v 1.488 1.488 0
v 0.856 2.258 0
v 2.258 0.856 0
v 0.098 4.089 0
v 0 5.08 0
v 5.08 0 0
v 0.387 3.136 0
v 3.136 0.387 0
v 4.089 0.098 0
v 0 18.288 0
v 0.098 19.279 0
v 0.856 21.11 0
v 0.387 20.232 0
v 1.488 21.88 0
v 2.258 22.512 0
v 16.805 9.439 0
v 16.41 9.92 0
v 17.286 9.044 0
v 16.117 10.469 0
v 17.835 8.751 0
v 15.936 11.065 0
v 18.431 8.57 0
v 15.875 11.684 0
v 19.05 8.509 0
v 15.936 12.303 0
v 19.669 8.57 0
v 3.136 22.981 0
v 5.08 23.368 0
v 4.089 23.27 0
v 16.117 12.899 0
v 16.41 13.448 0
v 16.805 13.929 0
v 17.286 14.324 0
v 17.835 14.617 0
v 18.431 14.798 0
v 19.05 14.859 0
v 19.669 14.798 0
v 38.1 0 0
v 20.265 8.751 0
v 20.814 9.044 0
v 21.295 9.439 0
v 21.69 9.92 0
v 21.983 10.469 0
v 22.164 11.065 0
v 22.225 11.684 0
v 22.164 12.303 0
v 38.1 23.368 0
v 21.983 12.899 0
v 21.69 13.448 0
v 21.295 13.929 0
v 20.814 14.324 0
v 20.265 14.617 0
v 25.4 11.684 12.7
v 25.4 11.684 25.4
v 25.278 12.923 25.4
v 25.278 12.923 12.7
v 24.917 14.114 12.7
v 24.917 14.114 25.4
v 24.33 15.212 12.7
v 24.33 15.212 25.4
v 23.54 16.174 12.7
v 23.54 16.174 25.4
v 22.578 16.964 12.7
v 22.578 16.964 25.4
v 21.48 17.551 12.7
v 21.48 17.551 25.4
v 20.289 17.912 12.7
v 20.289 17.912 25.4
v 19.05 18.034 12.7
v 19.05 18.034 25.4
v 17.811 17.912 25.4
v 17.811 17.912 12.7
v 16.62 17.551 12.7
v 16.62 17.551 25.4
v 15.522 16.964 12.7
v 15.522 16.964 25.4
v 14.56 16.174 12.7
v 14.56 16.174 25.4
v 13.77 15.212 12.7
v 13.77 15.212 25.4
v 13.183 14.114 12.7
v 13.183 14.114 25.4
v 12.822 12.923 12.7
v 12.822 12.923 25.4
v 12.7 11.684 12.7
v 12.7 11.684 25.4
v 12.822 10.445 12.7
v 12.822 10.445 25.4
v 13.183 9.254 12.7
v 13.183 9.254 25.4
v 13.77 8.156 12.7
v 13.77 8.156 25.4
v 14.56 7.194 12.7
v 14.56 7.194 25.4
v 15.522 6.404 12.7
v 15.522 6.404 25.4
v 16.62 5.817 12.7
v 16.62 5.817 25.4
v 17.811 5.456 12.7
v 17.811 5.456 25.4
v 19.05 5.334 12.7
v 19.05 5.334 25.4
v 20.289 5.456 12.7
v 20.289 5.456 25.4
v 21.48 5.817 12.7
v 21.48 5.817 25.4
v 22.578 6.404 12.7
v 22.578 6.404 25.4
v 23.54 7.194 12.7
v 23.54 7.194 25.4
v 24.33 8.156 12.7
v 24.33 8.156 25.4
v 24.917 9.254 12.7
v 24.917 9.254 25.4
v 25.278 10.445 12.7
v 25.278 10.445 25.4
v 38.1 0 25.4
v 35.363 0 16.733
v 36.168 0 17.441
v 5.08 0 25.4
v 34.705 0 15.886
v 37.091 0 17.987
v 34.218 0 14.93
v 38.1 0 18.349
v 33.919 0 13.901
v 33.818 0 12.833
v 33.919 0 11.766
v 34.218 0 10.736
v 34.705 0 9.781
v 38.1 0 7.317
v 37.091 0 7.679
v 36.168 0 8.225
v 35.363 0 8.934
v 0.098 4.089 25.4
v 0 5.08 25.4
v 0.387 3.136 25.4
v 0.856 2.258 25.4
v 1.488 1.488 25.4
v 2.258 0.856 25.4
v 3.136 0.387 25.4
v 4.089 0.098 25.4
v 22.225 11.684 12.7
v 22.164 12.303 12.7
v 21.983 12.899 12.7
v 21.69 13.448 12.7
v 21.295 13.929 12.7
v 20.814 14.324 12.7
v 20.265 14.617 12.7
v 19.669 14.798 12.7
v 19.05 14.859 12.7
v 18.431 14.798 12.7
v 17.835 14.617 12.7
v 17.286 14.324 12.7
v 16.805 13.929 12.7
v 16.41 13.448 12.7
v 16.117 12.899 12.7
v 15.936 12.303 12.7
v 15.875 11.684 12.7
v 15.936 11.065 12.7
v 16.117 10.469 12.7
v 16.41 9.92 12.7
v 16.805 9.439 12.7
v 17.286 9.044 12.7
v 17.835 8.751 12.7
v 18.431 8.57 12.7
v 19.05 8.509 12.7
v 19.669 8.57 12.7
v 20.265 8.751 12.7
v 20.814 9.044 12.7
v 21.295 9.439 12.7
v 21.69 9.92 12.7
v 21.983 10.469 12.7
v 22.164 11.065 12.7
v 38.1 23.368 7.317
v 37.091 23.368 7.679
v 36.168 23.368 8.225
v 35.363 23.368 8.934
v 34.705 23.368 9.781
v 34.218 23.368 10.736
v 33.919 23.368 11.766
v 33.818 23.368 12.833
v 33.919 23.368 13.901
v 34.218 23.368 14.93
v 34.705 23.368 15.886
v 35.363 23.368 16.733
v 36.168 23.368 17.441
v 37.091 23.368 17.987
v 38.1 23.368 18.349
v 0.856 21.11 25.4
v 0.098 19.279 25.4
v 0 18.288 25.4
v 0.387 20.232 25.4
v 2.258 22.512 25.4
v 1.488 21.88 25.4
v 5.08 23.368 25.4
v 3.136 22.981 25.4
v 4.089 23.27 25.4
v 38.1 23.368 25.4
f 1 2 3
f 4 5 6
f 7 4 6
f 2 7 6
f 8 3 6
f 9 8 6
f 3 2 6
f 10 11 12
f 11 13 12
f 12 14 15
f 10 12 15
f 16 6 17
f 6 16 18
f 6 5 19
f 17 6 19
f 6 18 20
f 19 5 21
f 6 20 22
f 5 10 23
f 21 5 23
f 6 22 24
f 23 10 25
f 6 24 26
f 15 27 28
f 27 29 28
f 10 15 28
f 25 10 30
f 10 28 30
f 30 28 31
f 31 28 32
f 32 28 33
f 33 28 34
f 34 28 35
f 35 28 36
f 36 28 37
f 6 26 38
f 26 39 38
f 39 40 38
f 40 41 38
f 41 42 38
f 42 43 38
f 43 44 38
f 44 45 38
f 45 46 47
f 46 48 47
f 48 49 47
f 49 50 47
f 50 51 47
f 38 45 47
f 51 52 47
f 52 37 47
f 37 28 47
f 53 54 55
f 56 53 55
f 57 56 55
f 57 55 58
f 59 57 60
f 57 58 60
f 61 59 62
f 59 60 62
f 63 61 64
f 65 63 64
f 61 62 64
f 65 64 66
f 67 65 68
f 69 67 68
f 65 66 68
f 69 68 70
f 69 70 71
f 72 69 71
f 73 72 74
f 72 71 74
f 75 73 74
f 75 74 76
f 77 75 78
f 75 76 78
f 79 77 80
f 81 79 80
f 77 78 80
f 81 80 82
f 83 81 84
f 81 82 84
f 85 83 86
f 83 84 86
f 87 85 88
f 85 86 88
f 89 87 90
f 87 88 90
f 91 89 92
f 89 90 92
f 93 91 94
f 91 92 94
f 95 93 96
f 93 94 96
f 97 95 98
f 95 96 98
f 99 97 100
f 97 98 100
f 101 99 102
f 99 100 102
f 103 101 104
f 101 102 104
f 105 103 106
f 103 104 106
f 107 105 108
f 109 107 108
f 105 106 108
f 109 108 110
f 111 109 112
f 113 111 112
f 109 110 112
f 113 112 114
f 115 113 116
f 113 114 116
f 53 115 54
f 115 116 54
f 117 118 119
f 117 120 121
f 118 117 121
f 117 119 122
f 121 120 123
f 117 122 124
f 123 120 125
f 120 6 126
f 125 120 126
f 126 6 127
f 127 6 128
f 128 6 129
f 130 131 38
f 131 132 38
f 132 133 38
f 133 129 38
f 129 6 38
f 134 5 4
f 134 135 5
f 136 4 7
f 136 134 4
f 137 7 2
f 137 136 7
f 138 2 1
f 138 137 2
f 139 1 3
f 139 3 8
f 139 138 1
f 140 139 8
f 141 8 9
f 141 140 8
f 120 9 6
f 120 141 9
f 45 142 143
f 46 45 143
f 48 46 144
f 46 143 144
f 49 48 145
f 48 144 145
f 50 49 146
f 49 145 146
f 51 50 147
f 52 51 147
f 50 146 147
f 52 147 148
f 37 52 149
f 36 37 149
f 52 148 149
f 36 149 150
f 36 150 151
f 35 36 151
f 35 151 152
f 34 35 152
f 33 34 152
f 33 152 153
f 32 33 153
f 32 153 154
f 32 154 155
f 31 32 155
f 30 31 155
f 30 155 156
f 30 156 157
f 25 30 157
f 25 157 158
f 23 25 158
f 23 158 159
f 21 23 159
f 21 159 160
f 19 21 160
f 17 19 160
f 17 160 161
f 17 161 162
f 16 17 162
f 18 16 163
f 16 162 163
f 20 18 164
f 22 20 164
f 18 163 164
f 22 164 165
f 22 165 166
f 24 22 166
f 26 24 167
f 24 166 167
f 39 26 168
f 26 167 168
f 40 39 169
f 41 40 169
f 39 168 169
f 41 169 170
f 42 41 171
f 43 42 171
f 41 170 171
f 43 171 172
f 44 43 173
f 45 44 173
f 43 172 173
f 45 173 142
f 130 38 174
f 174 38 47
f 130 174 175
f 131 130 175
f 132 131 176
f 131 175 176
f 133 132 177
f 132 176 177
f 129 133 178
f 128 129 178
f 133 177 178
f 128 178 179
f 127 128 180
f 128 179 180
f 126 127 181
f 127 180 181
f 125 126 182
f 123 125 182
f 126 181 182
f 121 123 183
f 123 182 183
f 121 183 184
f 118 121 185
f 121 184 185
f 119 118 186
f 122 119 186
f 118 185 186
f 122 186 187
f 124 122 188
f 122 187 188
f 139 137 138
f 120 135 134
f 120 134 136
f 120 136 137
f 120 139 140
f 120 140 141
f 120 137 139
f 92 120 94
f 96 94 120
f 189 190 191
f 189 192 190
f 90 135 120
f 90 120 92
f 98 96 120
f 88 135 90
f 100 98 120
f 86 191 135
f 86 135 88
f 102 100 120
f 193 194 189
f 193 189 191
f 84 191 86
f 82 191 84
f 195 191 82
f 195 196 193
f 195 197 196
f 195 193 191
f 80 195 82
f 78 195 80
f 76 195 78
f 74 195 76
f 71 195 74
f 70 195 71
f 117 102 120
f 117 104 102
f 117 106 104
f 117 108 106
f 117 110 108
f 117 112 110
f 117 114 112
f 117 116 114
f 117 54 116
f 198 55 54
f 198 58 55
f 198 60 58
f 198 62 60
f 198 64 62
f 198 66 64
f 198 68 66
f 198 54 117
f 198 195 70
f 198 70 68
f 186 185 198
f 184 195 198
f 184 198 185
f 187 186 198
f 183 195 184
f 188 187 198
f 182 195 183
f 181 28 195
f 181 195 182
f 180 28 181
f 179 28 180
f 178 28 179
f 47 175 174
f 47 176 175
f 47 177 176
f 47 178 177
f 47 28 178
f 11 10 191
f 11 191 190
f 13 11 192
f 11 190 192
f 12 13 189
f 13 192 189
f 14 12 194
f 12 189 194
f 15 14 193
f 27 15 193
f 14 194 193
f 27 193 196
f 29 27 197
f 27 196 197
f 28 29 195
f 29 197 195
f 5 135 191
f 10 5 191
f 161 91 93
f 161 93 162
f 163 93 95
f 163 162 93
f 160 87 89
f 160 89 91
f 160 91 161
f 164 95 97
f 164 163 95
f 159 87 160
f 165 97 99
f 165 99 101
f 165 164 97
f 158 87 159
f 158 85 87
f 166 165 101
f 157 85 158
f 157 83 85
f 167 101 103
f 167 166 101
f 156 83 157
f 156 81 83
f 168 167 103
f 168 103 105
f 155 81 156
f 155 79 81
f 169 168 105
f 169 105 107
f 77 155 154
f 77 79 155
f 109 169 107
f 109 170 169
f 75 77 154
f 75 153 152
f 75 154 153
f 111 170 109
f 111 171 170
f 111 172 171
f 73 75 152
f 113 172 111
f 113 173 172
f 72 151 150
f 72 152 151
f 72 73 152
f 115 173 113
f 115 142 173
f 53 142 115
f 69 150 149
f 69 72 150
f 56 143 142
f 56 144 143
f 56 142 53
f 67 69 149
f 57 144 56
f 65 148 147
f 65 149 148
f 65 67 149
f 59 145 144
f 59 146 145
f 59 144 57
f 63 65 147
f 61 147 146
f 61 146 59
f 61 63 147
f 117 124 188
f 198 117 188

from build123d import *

# Parameters (mm, degrees)
F0_W     = 38.1
F0_H     = 23.368
F1_DEPTH = 25.4
F2_R     = 6.35
F3_DEPTH = 12.7
F4_R     = 3.175
F5_DEPTH = 25.4
F6_R     = 5.08
F8_DEPTH = 25.4


with BuildPart() as f1:
    # F0 (on Top) → F1 (new body)
    with BuildSketch(Plane.XY):
        with Locations((19.05, 11.684)):
            Rectangle(F0_W, F0_H)
    extrude(amount=F1_DEPTH)

    # F2 (on face) → F3 (cut)
    with BuildSketch(Plane.XY.offset(25.4)):
        with Locations((19.05, 11.684)):
            Circle(F2_R)
    extrude(amount=-F3_DEPTH, mode=Mode.SUBTRACT)

    # F4 (on face) → F5 (cut)
    with BuildSketch(Plane.XY.offset(12.7)):
        with Locations((19.05, 11.684)):
            Circle(F4_R)
    extrude(amount=-F5_DEPTH, mode=Mode.SUBTRACT)

    # F6
    f6_edges = [f1.edges().sort_by_distance(p)[0] for p in [
        (0, 23.368, 12.7),
        (0, 0, 12.7),
    ]]
    fillet(f6_edges, radius=F6_R)

    # F7 (on face) → F8 (cut)
    with BuildSketch(Plane(origin=(0, 23.368, 0), x_dir=(-1, 0, 0), z_dir=(0, 1, 0))):
        with BuildLine():
            Line((-38.1, 18.349398), (-38.1, 7.316839))
            ThreePointArc((-38.1, 7.316839), (-33.818122, 12.833118), (-38.1, 18.349398))
        make_face()
    extrude(amount=-F8_DEPTH, mode=Mode.SUBTRACT)


solid = f1.part
